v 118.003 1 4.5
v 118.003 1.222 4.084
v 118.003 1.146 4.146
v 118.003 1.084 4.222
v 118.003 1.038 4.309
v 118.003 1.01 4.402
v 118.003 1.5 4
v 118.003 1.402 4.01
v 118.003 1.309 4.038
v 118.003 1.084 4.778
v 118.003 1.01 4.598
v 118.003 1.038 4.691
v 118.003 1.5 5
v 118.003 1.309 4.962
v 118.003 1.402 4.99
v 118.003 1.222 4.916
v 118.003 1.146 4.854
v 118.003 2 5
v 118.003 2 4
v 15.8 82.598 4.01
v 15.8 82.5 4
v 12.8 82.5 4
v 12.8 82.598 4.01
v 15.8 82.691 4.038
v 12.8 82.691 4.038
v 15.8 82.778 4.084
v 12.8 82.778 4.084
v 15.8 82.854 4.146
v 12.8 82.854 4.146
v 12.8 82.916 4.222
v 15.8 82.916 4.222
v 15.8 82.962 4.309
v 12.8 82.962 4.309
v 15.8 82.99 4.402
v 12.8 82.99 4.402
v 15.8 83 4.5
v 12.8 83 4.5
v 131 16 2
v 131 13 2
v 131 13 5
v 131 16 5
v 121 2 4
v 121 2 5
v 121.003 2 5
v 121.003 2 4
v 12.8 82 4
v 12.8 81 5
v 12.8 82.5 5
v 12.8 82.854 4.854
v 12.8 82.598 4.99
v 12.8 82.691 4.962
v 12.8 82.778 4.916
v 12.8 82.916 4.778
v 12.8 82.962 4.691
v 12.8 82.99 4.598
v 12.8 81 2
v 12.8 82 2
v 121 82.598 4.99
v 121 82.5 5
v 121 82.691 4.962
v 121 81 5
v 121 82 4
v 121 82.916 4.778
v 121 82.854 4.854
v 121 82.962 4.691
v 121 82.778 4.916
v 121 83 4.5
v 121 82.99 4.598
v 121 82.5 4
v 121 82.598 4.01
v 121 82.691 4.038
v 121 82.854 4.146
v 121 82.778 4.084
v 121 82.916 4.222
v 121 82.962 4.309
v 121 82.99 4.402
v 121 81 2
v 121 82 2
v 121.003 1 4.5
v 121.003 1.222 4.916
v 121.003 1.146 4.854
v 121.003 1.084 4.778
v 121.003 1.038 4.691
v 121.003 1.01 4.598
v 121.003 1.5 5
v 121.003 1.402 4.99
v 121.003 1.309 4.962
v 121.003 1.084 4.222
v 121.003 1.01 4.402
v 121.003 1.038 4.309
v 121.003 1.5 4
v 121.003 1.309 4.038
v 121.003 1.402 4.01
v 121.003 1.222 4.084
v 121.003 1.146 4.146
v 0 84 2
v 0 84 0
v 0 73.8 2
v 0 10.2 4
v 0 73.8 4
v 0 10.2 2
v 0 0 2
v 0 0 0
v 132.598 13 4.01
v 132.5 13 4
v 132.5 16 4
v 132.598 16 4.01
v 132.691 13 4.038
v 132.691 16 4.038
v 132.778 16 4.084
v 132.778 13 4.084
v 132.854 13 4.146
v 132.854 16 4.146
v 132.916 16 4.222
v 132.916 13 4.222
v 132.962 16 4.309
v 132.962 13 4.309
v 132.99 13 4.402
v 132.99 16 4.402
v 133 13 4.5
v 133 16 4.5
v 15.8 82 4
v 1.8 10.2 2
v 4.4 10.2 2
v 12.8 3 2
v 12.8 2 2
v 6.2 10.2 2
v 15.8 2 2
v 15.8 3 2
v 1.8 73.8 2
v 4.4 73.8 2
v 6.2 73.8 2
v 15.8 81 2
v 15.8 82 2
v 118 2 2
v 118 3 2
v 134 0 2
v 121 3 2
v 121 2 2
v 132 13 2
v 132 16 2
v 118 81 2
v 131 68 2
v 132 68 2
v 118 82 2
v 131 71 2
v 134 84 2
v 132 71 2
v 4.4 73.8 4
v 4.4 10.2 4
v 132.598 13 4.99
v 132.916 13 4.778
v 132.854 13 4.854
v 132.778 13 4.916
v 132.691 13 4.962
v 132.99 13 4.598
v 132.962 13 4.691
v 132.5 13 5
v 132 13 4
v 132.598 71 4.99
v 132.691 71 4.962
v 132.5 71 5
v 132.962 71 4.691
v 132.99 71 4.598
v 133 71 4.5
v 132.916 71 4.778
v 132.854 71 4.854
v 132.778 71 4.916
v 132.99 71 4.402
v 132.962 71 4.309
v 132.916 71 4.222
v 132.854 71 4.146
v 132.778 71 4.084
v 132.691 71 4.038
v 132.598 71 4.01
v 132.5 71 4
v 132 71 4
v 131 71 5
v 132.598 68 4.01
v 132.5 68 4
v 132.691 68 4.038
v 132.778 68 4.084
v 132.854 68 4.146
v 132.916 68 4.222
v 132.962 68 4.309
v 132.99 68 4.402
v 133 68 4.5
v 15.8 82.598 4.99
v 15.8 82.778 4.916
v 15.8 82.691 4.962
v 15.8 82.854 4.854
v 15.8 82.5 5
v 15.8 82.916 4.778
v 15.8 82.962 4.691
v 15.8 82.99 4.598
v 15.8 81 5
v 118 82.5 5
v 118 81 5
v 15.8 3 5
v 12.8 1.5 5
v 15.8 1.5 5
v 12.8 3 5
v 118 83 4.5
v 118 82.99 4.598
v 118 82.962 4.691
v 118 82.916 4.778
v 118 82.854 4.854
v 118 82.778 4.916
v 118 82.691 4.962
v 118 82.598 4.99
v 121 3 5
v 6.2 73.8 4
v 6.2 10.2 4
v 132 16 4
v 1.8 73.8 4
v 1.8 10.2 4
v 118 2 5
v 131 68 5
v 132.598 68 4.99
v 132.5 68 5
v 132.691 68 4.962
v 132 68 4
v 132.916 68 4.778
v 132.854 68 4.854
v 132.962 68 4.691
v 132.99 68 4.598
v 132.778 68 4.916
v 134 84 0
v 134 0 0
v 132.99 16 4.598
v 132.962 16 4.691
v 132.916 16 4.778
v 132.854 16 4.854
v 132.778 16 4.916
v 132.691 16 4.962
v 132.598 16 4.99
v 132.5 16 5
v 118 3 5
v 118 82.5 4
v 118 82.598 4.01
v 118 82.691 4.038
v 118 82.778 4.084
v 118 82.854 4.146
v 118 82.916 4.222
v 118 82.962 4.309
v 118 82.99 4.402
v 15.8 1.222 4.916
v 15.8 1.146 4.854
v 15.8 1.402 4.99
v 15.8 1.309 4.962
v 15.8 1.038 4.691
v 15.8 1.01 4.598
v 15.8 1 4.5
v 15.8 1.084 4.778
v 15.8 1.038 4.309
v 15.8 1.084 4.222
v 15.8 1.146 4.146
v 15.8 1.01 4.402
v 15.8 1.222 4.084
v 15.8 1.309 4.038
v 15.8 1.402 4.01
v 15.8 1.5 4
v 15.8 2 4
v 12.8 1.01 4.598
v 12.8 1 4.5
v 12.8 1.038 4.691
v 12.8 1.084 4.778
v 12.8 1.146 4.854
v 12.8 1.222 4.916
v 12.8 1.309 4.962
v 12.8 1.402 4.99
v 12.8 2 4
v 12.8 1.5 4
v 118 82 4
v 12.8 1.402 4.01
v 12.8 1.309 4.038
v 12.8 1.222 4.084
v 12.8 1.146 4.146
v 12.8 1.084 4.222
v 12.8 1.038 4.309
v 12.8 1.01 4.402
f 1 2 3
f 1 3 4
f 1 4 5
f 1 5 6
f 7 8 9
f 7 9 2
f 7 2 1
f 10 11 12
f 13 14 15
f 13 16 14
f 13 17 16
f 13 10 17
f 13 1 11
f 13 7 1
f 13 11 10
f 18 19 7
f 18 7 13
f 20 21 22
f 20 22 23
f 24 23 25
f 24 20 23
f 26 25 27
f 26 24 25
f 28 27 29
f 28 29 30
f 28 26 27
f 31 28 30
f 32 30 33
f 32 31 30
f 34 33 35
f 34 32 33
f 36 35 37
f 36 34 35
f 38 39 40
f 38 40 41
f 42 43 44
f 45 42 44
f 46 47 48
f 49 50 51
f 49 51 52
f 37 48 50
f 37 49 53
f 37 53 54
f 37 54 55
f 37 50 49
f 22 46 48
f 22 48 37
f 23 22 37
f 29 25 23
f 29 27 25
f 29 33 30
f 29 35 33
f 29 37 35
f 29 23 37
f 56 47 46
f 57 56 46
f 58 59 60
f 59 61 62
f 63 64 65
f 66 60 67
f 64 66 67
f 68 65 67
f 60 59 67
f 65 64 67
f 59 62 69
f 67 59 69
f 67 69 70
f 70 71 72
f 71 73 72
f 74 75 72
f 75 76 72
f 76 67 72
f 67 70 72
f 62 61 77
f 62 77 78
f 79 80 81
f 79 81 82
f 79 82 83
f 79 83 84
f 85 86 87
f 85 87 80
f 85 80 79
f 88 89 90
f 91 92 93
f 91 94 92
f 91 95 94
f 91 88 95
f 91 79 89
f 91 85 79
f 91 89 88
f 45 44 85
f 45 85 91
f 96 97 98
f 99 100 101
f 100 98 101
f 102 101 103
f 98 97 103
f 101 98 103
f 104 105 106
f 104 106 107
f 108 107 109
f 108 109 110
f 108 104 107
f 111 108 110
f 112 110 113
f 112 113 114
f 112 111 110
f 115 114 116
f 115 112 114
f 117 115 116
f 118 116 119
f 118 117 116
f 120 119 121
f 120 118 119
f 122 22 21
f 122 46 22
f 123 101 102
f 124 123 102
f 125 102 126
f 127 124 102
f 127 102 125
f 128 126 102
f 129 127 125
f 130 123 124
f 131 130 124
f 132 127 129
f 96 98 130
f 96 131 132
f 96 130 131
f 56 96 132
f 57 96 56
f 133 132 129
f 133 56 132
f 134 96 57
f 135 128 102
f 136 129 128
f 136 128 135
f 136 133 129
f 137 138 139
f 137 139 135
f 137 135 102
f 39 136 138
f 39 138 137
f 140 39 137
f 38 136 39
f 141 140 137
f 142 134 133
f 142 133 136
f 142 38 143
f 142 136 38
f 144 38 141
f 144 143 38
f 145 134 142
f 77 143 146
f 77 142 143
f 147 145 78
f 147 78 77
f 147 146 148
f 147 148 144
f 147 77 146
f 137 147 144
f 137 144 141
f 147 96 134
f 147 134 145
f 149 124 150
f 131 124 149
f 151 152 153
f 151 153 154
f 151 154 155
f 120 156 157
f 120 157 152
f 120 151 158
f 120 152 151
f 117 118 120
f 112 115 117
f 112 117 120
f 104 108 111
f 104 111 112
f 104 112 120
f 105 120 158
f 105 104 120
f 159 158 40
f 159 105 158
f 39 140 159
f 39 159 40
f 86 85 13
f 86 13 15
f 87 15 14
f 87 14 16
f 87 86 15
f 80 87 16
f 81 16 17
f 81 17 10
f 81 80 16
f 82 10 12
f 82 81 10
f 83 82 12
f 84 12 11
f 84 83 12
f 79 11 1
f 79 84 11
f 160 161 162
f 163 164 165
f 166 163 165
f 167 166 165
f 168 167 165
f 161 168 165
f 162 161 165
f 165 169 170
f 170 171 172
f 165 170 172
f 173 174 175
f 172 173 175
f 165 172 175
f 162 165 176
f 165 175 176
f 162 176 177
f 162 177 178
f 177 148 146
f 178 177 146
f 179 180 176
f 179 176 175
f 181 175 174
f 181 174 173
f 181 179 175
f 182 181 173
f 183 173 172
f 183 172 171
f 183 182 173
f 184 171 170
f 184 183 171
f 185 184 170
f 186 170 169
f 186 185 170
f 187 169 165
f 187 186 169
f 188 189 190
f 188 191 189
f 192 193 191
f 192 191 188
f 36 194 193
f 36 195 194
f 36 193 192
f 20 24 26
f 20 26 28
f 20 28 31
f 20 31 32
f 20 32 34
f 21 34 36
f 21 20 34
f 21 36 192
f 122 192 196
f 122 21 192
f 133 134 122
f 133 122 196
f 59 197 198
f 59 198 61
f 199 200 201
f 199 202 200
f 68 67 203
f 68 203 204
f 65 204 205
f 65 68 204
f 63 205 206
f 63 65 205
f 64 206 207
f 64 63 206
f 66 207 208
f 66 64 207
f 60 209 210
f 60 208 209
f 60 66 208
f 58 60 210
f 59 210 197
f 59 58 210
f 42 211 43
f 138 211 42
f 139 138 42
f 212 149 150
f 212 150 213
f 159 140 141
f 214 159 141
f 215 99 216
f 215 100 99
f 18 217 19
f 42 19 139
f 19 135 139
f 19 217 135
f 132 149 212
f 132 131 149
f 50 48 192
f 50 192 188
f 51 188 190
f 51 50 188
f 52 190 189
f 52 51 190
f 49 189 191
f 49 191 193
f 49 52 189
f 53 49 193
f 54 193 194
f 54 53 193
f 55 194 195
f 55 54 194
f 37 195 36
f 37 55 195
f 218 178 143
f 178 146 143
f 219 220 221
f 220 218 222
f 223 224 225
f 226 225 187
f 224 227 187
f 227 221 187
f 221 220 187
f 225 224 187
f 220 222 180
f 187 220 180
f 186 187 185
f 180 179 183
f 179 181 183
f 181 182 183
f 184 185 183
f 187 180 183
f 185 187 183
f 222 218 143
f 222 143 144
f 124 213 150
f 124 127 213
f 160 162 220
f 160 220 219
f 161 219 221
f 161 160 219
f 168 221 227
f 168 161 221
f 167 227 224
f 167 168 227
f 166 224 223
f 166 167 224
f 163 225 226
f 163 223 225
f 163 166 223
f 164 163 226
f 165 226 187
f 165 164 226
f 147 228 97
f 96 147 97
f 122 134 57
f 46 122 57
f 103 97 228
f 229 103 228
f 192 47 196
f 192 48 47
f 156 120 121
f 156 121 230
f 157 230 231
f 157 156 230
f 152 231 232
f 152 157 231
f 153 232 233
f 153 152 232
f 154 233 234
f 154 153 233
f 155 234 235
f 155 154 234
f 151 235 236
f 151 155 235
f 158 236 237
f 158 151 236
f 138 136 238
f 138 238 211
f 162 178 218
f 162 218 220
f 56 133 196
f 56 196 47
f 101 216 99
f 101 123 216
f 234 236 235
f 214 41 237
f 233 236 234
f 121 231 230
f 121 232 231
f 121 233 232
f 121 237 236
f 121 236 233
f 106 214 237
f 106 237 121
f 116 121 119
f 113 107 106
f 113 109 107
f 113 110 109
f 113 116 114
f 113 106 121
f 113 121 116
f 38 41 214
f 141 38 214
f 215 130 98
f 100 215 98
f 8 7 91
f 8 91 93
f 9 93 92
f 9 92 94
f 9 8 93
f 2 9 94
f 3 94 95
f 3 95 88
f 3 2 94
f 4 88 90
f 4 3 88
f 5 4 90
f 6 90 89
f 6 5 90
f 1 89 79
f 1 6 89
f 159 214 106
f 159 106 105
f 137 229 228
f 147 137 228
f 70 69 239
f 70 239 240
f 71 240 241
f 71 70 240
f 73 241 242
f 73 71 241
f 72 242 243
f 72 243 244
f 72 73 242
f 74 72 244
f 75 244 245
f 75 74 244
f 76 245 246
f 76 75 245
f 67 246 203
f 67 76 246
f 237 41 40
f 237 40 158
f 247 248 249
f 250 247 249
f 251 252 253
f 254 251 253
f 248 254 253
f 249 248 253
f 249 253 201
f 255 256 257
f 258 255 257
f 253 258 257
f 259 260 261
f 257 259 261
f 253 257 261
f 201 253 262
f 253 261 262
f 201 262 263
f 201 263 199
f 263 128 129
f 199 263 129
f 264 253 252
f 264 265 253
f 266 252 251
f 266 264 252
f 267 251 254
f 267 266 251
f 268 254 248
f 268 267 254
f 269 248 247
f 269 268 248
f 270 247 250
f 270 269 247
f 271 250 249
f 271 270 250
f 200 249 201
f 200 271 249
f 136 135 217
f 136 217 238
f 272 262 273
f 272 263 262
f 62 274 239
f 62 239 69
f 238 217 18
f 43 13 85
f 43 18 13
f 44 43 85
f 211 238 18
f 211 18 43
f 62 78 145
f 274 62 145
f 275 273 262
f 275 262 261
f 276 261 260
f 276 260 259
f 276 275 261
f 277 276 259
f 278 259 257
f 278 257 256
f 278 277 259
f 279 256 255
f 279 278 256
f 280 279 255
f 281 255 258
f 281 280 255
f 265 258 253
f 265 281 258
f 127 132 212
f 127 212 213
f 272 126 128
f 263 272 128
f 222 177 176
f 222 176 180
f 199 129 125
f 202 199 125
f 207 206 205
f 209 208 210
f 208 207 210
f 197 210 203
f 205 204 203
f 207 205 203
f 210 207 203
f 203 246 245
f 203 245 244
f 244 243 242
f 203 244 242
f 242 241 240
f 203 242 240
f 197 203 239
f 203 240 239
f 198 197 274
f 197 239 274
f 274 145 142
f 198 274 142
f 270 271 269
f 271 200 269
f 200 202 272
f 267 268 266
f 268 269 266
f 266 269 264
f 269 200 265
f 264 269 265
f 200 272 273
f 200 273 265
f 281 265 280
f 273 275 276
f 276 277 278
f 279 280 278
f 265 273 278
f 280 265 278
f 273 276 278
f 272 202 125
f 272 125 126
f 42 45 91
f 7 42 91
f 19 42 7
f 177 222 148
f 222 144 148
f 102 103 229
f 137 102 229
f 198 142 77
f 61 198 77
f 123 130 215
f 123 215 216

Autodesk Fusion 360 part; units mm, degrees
sketch "Sketch1" plane through (0, 0, 0) normal (0, 0, 1) x (1, 0, 0)
  line L0 (0, 0) -> (134, 0)
  line L1 (134, 0) -> (134, 84)
  line L2 (134, 84) -> (0, 84)
  line L3 (0, 84) -> (0, 0)
  line L4 (2, 2) -> (132, 2)
  line L5 (132, 2) -> (132, 82)
  line L6 (132, 82) -> (2, 82)
  line L7 (0, 82) -> (1.8, 82)
  line L8 (1.8, 82) -> (1.8, 73.8)
  line L9 (1.8, 73.8) -> (0, 73.8)
  line L10 (0, 73.8) -> (0, 82)
  line L11 (0, 73.8) -> (1.8, 73.8)
  line L12 (1.8, 73.8) -> (1.8, 10.2)
  line L13 (1.8, 10.2) -> (0, 10.2)
  line L14 (0, 10.2) -> (0, 73.8)
  line L15 (4.4, 73.8) -> (4.4, 72.6661)
  line L16 (2, 72.6661) -> (2, 73.8)
  line L17 (4.4, 73.8) -> (6.2, 73.8)
  line L18 (6.2, 73.8) -> (6.2, 10.2)
  line L19 (6.2, 10.2) -> (4.4, 10.2)
  line L20 (4.4, 10.2) -> (4.4, 73.8)
  line L21 (2, 82) -> (1.8, 82)
  line L22 (1.8, 10.2) -> (1.8, 2)
  line L23 (2, 2) -> (1.8, 2)
  line L24 (1.8, 2) -> (12.8, 2)
  line L25 (12.8, 2) -> (15.8, 2)
  line L26 (15.8, 2) -> (15.8, 3)
  line L27 (15.8, 3) -> (12.8, 3)
  line L28 (12.8, 3) -> (12.8, 2)
  line L29 (12.8, 82) -> (15.8, 82)
  line L30 (15.8, 82) -> (15.8, 81)
  line L31 (15.8, 81) -> (12.8, 81)
  line L32 (12.8, 81) -> (12.8, 82)
  line L33 (132, 82) -> (121, 82)
  line L34 (132, 82) -> (132, 71)
  line L35 (121, 82) -> (118, 82)
  line L36 (118, 82) -> (118, 81)
  line L37 (118, 81) -> (121, 81)
  line L38 (121, 81) -> (121, 82)
  line L39 (132, 71) -> (131, 71)
  line L40 (131, 71) -> (131, 68)
  line L41 (131, 68) -> (132, 68)
  line L42 (132, 68) -> (132, 71)
  line L43 (132, 2) -> (132, 13)
  line L44 (132, 2) -> (121, 2)
  line L45 (132, 13) -> (131, 13)
  line L46 (131, 13) -> (131, 16)
  line L47 (131, 16) -> (132, 16)
  line L48 (132, 16) -> (132, 13)
  line L49 (121, 2) -> (118, 2)
  line L50 (118, 2) -> (118, 3)
  line L51 (118, 3) -> (121, 3)
  line L52 (121, 3) -> (121, 2)
  dimension "d1" = 134
  dimension "d2" = 84
  dimension "d33" = 130
  dimension "d34" = 80
  dimension "d35" = 1.8
  dimension "d36" = 8.2
  dimension "d37" = 63.6
  dimension "d38" = 2.4
  dimension "d39" = 1.8
  dimension "d41" = 11
  dimension "d42" = 3
  dimension "d43" = 1
  dimension "d44" = 1
  dimension "d45" = 11
  dimension "d46" = 11
  dimension "d47" = 3
  dimension "d48" = 11
  dimension "d49" = 11
  dimension "d50" = 1
  dimension "d51" = 3
extrude "Extrude1" add sketch "Sketch1" along normal blind 2 contours L0 L1 L2 L3 L4 L5 L6 L7 L13 L21 L22 L23 L24 L25 L29 L33 L34 L35 L42 L43 L44 L48 L49 | L3 L9 L11 L12 L13 L14 | L3 L7 L8 L9 L10 L11 | L4 L5 L6 L8 L12 L21 L22 L23 L24 L26 L27 L28 L30 L31 L32 L33 L34 L36 L37 L38 L39 L40 L41 L43 L44 L45 L46 L47 L50 L51 L52 | L4 L25 L26 L27 L28 | L6 L29 L30 L31 L32 | L4 L49 L50 L51 L52 | L6 L35 L36 L37 L38 | L5 L45 L46 L47 L48 | L5 L39 L40 L41 L42 | L15 L17 L18 L19 L20
extrude "Extrude7" add sketch "Sketch1" along normal blind 5 contours L4 L25 L26 L27 L28 | L6 L29 L30 L31 L32 | L4 L49 L50 L51 L52 | L6 L35 L36 L37 L38 | L5 L45 L46 L47 L48 | L5 L39 L40 L41 L42
extrude "Extrude8" add sketch "Sketch1" along normal blind 4 contours L3 L9 L11 L12 L13 L14 | L15 L17 L18 L19 L20
sketch "Sketch8" plane through (0, 2, 0) normal (0, -1, 0) x (1, 0, 0)
  line L0 (12.8, 2) -> (15.8, 2)
  line L1 (15.8, 2) -> (15.8, 5)
  line L2 (15.8, 5) -> (12.8, 5)
  line L3 (12.8, 5) -> (12.8, 2)
  line L4 (12.8, 5) -> (15.8, 5)
  line L5 (15.8, 5) -> (15.8, 4)
  line L6 (15.8, 4) -> (12.8, 4)
  line L7 (12.8, 4) -> (12.8, 5)
  line L8 (118.0033, 5) -> (121.0033, 5)
  line L9 (121.0033, 5) -> (121.0033, 4)
  line L10 (121.0033, 4) -> (118.0033, 4)
  line L11 (118.0033, 4) -> (118.0033, 5)
  dimension "d56" = 1
  dimension "d57" = 3
  dimension "d58" = 1
extrude "Extrude9" add sketch "Sketch8" along normal blind 1 contours L1 L2 L3 L4 L5 L6 L7 | L8 L9 L10 L11
sketch "Sketch9" plane through (132, 0, 0) normal (1, 0, 0) x (0, 1, 0)
  line L0 (13, 2) -> (16, 2)
  line L1 (16, 2) -> (16, 5)
  line L2 (16, 5) -> (13, 5)
  line L3 (13, 5) -> (13, 2)
  line L4 (13, 5) -> (16, 5)
  line L5 (16, 5) -> (16, 4)
  line L6 (16, 4) -> (13, 4)
  line L7 (13, 4) -> (13, 5)
  line L8 (68, 5) -> (71, 5)
  line L9 (71, 5) -> (71, 4)
  line L10 (71, 4) -> (68, 4)
  line L11 (68, 4) -> (68, 5)
  dimension "d61" = 3
  dimension "d62" = 1
  dimension "d63" = 3
  dimension "d64" = 1
extrude "Extrude10" add sketch "Sketch9" along normal blind 1 contours L1 L2 L3 L4 L5 L6 L7 | L8 L9 L10 L11
sketch "Sketch10" plane through (0, 82, 0) normal (0, 1, 0) x (-1, 0, 0)
  line L0 (-121, 2) -> (-118, 2)
  line L1 (-118, 2) -> (-118, 5)
  line L2 (-118, 5) -> (-121, 5)
  line L3 (-121, 5) -> (-121, 2)
  line L4 (-15.8, 5) -> (-12.8, 5)
  line L5 (-12.8, 5) -> (-12.8, 4)
  line L6 (-12.8, 4) -> (-15.8, 4)
  line L7 (-15.8, 4) -> (-15.8, 5)
  line L8 (-121, 5) -> (-118, 5)
  line L9 (-118, 5) -> (-118, 4)
  line L10 (-118, 4) -> (-121, 4)
  line L11 (-121, 4) -> (-121, 5)
  dimension "d67" = 3
  dimension "d68" = 1
  dimension "d69" = 3
  dimension "d70" = 1
extrude "Extrude11" add sketch "Sketch10" along normal blind 1 contours L1 L2 L3 L8 L9 L10 L11 | L4 L5 L6 L7
fillet "Fillet2" radius 0.5 12 edges at (119.5, 83, 5) (119.5, 83, 4) (133, 69.5, 5) (133, 69.5, 4) (133, 14.5, 5) (133, 14.5, 4) (119.5033, 1, 5) (14.3, 83, 5) (14.3, 83, 4) (14.3, 1, 5) (14.3, 1, 4) (119.5033, 1, 4)
equation "d35 = 2 mm - 0.2 mm"
equation "d37 = 80 mm - ( 8.2 * 2 ) * 1 mm"
equation "d41 = 15 mm - 3 mm - 1 mm"
equation "d52 = 3 mm + 2 mm"
equation "d54 = 2 mm + 2 mm"
